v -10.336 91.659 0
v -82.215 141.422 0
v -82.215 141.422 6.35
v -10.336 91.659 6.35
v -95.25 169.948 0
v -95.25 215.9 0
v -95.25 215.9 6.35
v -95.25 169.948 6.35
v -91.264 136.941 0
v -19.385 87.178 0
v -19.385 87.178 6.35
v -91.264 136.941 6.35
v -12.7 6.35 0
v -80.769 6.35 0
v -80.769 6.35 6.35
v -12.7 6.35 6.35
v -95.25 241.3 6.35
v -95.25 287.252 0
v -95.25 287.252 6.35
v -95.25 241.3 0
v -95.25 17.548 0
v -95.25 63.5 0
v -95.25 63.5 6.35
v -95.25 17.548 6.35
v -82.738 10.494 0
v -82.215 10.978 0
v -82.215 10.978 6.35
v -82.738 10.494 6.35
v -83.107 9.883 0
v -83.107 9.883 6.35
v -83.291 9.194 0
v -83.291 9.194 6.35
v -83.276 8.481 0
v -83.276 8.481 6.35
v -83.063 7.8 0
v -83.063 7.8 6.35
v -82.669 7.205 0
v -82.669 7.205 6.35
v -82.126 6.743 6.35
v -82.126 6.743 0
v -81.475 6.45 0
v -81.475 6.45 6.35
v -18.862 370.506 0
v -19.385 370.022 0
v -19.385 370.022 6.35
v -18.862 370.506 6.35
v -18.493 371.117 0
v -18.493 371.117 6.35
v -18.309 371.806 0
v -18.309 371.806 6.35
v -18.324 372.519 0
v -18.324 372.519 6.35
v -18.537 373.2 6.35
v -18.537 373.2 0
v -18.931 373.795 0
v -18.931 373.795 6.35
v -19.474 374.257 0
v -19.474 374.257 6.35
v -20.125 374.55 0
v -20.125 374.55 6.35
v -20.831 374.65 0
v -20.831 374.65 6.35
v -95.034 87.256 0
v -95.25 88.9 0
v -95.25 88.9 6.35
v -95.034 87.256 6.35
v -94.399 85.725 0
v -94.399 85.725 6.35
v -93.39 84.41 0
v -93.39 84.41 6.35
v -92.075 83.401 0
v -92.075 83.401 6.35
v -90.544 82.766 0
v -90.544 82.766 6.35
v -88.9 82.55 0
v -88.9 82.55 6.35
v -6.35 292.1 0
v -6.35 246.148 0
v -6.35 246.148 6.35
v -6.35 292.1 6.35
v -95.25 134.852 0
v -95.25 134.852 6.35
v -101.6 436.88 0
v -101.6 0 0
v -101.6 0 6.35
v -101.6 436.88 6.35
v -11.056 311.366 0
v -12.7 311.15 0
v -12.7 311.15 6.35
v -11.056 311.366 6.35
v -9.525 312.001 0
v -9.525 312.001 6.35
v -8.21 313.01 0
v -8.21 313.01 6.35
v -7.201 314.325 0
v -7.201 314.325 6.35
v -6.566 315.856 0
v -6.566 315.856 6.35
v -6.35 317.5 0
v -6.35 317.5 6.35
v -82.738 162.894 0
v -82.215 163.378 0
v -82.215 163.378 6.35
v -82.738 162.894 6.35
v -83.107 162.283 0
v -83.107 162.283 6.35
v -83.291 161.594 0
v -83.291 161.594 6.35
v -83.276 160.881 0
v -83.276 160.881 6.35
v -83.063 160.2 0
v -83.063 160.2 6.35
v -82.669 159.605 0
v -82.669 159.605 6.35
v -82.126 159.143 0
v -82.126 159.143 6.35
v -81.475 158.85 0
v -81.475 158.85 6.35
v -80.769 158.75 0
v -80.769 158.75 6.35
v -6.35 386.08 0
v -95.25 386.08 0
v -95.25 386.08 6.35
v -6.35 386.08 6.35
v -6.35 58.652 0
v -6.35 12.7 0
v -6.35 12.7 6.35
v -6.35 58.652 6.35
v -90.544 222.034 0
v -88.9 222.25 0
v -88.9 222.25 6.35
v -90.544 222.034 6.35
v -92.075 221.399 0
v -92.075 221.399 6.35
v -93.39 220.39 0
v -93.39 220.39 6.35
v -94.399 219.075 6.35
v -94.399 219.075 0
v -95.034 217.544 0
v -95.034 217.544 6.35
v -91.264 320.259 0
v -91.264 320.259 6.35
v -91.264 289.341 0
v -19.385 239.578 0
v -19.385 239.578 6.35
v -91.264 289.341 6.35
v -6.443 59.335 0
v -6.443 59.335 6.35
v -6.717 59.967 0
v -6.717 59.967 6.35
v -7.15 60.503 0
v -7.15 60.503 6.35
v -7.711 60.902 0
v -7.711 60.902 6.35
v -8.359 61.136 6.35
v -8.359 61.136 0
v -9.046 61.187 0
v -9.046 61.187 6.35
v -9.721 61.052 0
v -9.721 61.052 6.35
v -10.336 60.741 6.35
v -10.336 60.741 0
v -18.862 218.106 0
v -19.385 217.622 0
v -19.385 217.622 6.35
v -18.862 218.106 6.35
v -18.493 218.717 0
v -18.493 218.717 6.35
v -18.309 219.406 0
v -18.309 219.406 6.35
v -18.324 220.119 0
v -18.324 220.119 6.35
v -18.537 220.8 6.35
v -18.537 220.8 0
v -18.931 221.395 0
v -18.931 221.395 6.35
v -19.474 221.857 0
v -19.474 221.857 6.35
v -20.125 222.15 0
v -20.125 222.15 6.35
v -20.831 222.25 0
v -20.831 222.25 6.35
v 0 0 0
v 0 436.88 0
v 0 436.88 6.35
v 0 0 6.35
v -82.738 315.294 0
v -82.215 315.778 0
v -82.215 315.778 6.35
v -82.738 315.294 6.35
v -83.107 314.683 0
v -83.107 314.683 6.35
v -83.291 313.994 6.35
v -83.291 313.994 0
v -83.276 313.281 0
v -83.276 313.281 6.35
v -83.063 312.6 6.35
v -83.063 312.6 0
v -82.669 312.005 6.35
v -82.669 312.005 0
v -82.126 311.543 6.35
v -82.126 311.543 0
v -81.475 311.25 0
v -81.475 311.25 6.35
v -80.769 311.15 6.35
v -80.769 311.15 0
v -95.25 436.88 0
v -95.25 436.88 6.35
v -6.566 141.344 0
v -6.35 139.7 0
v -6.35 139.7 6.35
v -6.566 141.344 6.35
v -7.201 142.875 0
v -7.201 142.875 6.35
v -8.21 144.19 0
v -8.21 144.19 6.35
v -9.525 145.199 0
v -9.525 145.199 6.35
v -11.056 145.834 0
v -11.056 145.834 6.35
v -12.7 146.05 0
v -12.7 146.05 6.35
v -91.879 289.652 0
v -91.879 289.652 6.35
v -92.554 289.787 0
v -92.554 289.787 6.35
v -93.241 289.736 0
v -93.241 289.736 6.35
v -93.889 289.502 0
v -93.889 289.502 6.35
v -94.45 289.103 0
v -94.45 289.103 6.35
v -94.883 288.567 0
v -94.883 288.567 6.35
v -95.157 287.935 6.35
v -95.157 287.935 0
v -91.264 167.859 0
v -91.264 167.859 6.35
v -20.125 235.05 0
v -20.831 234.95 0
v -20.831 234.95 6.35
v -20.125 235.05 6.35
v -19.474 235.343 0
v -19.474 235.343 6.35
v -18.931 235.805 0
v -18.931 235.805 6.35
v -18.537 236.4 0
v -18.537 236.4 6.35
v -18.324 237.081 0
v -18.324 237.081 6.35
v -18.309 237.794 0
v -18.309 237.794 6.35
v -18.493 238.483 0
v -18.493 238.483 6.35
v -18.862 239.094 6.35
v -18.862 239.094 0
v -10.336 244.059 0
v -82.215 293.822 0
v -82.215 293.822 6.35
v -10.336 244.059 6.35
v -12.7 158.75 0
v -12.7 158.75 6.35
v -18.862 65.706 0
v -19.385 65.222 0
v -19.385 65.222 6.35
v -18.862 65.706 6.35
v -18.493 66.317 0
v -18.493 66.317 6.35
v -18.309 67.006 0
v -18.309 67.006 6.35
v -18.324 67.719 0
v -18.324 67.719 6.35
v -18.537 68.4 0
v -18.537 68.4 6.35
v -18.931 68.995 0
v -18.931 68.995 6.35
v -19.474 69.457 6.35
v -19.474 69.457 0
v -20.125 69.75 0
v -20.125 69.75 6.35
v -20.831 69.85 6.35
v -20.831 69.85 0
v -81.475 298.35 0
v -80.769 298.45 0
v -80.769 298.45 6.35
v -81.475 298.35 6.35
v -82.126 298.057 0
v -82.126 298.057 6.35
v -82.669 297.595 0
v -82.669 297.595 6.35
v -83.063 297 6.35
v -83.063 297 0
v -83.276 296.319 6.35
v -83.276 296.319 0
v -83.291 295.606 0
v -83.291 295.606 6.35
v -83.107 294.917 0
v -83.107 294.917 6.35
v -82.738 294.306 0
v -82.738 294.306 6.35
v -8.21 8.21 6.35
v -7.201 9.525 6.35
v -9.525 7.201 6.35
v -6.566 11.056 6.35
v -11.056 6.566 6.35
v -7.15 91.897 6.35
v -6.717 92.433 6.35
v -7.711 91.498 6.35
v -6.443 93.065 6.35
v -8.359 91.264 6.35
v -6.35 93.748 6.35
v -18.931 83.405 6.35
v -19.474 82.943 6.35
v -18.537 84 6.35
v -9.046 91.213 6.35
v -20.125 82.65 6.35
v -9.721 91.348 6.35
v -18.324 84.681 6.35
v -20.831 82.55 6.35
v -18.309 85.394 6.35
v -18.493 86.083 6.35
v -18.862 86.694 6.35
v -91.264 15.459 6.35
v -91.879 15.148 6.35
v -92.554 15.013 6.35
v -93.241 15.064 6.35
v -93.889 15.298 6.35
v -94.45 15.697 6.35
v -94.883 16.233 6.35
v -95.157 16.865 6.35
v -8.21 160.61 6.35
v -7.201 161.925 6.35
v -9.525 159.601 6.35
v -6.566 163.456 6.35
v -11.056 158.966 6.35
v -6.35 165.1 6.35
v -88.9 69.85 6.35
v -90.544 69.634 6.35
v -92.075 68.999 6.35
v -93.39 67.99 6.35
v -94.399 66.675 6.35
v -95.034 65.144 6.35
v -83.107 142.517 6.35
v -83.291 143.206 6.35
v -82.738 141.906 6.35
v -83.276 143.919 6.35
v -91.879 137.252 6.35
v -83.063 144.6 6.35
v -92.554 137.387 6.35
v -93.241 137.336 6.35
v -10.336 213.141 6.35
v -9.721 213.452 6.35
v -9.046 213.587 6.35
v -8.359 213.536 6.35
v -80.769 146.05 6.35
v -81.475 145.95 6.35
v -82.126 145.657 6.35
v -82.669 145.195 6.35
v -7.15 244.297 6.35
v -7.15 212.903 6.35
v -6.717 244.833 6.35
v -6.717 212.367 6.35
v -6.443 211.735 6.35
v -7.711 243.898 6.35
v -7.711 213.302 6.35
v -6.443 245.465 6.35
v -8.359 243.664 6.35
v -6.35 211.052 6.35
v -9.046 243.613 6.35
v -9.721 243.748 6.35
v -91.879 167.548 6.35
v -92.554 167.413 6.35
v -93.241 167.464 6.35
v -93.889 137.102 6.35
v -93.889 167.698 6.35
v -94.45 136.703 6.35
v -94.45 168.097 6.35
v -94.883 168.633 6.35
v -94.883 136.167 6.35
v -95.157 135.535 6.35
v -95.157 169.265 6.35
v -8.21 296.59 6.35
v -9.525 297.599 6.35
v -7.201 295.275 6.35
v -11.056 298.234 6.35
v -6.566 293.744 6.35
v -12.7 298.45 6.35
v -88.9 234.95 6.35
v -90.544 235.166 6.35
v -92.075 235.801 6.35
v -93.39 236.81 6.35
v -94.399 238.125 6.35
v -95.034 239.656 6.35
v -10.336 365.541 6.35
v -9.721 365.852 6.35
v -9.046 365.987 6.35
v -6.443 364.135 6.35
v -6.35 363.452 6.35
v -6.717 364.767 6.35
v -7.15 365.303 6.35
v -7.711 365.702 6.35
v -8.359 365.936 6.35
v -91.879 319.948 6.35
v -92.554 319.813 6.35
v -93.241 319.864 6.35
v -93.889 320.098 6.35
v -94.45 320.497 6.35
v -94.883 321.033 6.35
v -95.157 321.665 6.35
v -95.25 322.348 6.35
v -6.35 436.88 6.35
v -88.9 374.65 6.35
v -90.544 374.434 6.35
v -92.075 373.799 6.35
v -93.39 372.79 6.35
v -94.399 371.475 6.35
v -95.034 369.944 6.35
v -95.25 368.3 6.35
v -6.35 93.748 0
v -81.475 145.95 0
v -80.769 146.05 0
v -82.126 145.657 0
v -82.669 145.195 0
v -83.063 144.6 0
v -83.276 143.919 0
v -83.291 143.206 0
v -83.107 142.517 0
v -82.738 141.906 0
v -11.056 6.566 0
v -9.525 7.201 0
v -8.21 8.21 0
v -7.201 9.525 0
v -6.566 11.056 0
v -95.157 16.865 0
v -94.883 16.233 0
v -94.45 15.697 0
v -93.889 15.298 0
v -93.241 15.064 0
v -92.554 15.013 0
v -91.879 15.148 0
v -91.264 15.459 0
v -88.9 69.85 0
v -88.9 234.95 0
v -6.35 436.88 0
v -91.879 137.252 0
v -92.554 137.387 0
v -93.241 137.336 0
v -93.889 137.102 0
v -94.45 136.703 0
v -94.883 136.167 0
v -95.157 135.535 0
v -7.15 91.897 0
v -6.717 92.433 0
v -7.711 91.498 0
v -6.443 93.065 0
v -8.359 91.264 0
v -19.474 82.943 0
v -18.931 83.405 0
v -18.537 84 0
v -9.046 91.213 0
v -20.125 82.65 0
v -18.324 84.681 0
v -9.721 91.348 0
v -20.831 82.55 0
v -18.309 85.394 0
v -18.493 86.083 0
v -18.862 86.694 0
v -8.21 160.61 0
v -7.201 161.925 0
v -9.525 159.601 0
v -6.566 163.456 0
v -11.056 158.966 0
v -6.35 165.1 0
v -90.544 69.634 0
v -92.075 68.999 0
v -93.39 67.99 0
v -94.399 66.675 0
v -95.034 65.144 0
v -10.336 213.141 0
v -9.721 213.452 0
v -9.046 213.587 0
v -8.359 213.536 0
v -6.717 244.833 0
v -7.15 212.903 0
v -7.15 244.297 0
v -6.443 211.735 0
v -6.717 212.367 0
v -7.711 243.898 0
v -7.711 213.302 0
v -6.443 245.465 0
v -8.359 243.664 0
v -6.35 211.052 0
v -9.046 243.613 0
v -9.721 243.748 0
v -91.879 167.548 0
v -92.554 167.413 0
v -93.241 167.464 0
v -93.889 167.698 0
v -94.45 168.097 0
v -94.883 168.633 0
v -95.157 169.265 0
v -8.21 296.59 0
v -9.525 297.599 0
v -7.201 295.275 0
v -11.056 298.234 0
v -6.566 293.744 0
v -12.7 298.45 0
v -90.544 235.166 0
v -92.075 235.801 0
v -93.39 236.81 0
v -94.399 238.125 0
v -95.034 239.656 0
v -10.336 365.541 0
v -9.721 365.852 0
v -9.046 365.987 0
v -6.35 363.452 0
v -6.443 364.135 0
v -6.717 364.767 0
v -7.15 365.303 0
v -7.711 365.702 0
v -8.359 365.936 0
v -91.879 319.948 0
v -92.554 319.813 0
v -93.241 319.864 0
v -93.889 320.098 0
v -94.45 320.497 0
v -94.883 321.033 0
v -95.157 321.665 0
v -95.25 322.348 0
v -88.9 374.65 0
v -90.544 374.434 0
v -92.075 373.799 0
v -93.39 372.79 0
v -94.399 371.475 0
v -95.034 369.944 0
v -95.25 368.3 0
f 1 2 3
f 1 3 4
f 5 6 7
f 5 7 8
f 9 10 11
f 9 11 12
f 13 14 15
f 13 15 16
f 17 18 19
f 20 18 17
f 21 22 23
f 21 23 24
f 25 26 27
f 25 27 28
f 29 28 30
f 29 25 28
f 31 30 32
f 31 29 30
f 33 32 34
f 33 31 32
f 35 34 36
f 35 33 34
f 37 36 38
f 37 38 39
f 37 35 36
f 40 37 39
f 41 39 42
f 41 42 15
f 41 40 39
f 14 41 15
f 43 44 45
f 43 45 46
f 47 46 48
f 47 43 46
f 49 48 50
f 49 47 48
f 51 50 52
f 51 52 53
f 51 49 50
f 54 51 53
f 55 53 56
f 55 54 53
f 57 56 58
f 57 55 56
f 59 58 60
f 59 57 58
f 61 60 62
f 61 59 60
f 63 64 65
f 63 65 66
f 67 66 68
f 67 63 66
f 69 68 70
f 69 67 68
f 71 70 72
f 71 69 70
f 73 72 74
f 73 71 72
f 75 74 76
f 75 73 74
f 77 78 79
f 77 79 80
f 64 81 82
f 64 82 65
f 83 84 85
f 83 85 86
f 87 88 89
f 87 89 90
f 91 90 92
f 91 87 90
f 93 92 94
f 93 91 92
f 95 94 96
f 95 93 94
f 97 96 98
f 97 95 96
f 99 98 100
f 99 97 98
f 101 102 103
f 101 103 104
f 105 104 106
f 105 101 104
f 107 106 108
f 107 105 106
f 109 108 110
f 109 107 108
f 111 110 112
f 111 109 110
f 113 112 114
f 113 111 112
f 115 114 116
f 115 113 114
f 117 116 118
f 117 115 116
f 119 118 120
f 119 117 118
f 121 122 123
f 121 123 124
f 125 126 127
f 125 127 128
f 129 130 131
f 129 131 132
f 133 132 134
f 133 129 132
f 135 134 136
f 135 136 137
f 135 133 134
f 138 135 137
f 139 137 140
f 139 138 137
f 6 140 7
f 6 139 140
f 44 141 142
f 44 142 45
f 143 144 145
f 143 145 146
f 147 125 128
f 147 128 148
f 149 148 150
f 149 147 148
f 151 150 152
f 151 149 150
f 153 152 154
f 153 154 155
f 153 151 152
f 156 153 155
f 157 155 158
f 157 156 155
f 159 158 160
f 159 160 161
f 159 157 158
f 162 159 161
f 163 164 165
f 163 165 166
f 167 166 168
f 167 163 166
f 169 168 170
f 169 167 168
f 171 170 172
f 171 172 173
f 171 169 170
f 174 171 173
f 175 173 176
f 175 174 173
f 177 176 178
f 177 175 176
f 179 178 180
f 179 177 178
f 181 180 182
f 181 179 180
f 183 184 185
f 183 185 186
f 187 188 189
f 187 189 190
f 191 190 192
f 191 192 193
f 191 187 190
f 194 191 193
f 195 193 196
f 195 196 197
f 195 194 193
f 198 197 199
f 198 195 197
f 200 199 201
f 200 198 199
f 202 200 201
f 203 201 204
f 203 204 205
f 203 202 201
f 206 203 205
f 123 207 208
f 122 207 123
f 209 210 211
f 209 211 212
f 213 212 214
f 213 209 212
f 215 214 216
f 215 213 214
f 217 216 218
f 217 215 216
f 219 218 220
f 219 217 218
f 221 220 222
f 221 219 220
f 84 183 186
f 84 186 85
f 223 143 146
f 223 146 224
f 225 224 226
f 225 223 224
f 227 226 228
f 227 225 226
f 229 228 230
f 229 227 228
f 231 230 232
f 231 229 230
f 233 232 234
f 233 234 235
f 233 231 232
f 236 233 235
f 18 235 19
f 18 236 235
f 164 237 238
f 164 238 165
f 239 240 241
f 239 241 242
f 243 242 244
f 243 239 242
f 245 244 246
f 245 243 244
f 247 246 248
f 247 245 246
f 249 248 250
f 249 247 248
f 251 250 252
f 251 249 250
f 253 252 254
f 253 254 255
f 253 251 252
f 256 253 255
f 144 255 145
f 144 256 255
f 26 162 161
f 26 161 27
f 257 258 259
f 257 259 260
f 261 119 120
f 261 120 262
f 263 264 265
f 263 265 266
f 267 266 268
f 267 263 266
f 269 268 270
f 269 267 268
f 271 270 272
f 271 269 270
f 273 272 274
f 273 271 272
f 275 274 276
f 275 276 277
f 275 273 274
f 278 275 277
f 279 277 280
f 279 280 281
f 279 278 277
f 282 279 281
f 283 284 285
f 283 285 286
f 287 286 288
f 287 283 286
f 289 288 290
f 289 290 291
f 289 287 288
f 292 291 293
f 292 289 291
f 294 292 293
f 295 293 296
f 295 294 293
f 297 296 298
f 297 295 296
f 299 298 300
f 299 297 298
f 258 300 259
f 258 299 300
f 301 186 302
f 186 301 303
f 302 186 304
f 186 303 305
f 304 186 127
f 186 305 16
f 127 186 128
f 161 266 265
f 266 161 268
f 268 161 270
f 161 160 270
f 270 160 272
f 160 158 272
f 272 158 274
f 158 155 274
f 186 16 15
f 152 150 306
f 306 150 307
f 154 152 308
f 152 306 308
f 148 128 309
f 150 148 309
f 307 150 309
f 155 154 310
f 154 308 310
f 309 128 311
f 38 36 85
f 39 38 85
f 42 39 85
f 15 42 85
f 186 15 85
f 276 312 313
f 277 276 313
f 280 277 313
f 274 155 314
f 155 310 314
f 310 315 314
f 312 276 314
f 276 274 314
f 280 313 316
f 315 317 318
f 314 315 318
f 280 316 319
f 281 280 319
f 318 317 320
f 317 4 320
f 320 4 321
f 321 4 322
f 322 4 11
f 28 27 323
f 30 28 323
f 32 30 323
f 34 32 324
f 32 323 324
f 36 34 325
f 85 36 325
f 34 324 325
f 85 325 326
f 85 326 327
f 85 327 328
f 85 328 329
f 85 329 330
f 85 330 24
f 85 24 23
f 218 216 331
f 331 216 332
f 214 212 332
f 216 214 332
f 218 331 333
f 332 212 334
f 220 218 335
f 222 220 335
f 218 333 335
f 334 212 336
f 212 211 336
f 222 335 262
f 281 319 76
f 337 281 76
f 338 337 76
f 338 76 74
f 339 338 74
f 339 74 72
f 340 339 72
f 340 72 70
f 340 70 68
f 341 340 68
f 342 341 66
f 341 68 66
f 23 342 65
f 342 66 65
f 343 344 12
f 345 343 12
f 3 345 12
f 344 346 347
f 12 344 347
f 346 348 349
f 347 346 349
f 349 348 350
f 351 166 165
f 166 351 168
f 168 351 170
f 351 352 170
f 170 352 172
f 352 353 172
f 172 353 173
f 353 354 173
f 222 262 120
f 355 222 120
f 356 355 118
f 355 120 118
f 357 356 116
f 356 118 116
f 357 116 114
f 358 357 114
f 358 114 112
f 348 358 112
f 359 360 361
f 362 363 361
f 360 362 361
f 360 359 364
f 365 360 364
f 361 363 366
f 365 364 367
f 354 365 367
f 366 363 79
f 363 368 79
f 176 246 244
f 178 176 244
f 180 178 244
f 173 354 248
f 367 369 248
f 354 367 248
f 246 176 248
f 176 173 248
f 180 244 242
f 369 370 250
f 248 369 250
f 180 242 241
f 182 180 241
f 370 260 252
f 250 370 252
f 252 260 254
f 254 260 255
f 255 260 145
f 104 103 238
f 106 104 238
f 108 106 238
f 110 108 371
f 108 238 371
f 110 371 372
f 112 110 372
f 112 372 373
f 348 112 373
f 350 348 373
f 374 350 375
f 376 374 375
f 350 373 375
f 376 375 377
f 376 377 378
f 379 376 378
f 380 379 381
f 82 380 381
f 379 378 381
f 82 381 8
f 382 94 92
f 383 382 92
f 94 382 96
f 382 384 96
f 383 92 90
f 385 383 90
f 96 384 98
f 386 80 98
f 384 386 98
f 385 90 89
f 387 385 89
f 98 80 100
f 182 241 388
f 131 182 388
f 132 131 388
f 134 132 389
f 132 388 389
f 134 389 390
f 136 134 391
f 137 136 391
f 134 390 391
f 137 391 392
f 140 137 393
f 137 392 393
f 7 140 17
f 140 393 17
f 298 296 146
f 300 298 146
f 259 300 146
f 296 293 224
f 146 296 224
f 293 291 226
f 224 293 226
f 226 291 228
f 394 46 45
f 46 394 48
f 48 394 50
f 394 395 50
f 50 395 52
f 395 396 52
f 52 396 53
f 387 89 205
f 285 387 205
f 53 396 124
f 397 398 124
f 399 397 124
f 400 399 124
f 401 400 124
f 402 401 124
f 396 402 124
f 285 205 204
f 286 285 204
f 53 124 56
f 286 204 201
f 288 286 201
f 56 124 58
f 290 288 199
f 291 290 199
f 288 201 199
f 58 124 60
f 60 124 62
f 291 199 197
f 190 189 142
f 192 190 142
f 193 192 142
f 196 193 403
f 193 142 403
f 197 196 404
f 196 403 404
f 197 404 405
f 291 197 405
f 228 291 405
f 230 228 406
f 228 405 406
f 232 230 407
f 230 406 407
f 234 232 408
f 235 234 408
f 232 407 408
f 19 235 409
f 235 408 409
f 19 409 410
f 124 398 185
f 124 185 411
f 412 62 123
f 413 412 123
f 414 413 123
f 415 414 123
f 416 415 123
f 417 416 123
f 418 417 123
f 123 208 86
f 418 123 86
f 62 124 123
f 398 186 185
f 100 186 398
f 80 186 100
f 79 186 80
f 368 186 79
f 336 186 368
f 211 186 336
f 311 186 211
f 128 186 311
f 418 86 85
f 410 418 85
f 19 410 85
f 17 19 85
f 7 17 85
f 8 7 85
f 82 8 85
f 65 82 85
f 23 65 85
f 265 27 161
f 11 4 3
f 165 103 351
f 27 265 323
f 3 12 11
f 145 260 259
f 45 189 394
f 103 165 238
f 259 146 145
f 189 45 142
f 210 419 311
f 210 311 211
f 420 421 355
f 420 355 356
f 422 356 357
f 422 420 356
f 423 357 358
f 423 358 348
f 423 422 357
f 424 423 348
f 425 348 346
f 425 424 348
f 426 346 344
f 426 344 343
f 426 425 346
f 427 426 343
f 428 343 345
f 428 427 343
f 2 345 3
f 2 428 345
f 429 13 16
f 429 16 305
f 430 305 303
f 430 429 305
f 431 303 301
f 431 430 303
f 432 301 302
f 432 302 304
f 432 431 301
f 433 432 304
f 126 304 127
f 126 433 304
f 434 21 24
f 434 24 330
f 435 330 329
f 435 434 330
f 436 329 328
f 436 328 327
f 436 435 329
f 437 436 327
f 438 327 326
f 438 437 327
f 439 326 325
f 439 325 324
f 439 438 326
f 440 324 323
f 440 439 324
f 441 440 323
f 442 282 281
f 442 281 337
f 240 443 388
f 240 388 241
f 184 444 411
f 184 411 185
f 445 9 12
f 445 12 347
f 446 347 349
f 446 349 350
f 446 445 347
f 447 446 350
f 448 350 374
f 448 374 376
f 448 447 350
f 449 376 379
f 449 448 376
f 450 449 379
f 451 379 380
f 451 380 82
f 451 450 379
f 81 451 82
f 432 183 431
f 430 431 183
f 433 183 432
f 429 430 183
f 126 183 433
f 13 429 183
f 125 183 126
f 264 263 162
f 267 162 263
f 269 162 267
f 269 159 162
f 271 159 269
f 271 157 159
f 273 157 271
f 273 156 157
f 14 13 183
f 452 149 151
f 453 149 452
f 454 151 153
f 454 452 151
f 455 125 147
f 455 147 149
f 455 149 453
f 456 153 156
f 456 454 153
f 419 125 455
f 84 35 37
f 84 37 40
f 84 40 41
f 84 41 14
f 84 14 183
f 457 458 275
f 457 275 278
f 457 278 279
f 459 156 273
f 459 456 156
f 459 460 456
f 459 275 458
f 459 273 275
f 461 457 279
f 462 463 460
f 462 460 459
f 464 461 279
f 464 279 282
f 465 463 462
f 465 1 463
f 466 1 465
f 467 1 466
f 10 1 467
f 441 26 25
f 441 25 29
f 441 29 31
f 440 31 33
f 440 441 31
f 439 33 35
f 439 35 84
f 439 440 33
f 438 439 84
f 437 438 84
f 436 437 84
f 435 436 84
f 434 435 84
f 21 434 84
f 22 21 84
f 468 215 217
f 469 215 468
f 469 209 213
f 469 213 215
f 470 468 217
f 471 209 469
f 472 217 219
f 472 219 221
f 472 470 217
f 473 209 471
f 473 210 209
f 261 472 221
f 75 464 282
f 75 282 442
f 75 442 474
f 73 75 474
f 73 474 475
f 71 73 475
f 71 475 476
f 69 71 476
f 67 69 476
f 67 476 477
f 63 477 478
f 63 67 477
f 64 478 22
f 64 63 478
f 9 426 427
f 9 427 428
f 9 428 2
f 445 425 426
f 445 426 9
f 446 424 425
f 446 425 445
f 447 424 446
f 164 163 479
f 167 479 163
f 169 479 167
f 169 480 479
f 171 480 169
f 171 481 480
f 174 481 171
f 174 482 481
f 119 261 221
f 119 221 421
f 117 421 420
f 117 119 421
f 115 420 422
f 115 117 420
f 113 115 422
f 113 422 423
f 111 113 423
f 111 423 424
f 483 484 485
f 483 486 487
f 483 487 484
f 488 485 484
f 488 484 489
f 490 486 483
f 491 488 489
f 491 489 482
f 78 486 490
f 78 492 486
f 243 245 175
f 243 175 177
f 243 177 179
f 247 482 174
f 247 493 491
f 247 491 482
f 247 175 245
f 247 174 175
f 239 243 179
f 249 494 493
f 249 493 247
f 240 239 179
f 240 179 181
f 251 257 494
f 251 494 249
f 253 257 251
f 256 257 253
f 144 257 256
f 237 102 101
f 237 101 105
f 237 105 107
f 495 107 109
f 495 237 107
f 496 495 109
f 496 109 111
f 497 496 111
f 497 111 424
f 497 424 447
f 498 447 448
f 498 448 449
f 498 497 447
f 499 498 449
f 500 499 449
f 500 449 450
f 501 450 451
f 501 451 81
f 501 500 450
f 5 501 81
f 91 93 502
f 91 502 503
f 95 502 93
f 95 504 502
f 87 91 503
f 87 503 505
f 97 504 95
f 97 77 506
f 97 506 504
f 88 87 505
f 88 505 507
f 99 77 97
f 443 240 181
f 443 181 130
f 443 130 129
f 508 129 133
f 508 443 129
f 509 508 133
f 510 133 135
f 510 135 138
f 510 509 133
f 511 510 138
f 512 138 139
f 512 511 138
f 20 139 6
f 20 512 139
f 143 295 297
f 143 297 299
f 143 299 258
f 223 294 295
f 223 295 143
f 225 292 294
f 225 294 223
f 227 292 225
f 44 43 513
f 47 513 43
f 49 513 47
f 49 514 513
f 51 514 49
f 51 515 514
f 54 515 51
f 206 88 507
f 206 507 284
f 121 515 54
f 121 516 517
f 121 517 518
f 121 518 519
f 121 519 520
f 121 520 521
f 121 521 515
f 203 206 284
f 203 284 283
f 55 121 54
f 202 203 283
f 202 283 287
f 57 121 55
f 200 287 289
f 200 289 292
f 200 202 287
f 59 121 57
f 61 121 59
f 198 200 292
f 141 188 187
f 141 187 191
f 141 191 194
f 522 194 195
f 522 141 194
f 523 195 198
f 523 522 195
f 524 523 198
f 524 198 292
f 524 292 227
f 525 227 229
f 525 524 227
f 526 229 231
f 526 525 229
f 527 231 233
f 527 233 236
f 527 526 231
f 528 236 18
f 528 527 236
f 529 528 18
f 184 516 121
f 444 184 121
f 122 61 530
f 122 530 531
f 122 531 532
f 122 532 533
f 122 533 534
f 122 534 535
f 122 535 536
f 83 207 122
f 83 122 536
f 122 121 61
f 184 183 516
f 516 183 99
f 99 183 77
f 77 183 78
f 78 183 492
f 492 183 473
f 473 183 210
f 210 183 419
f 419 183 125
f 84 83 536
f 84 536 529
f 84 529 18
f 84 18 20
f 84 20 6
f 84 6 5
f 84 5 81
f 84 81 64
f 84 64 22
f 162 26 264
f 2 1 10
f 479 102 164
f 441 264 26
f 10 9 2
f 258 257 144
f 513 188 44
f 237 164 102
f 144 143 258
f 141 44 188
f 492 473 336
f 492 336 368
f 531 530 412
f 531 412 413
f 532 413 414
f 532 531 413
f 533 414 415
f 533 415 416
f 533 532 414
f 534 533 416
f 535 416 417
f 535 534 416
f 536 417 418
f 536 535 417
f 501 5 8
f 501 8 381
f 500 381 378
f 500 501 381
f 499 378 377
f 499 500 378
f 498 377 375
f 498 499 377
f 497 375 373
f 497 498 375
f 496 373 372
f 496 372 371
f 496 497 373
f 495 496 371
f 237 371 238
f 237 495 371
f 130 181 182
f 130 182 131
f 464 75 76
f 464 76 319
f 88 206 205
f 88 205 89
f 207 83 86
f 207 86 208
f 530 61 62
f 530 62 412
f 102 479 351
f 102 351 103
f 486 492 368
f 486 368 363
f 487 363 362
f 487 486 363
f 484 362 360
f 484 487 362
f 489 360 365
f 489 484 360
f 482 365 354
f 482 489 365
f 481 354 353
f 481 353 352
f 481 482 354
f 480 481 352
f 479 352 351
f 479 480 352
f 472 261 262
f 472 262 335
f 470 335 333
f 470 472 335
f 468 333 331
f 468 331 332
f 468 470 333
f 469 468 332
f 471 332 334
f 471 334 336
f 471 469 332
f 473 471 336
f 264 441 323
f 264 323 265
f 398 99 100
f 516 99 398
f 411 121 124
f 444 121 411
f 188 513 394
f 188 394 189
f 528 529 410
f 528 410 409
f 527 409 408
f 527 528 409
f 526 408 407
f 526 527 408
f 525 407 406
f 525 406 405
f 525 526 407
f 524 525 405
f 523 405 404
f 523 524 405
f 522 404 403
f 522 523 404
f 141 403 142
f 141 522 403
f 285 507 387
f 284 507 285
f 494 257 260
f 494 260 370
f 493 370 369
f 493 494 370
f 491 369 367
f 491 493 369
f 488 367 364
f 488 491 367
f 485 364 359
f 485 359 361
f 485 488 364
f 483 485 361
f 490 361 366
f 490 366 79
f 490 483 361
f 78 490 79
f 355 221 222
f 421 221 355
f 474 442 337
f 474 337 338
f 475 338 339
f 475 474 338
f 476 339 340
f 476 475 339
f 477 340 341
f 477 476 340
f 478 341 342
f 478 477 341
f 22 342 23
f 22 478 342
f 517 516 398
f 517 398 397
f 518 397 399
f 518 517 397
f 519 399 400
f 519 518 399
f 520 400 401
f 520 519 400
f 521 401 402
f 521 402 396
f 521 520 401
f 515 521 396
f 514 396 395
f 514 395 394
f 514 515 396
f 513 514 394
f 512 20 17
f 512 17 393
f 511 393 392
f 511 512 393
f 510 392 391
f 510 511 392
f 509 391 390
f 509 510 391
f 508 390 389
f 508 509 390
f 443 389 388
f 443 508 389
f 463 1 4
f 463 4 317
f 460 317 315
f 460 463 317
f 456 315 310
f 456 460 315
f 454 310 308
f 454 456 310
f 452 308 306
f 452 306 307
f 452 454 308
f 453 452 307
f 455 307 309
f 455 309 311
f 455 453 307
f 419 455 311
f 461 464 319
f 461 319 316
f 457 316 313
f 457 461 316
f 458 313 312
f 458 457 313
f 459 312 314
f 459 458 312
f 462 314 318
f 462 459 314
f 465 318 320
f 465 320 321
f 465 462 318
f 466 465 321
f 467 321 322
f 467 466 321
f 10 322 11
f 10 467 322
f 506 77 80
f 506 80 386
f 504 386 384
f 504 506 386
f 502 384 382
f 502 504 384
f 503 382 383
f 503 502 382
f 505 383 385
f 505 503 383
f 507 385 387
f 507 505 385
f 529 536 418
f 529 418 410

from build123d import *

# Parameters (mm, degrees)
BOSS_EXTRUDE1_DEPTH = 6.35


with BuildPart() as part:
    # Model → Boss-Extrude1 (new body)
    with BuildSketch(Plane.XY):
        Polygon((-95.25, 386.08), (-6.35, 386.08), (-6.35, 436.88), (0, 436.88), (0, 0), (-101.6, 0), (-101.6, 436.88), (-95.25, 436.88), align=None)
        with BuildLine():
            Line((-80.76878597, 311.15), (-12.7, 311.15))
            ThreePointArc((-12.7, 311.15), (-8.209871939, 313.009871939), (-6.35, 317.5))
            Line((-6.35, 317.5), (-6.35, 363.45223644))
            ThreePointArc((-6.35, 363.45223644), (-7.711169032, 365.702115893), (-10.335793346, 365.540604607))
            Line((-10.335793346, 365.540604607), (-82.214579316, 315.778368167))
            ThreePointArc((-82.214579316, 315.778368167), (-83.193250358, 312.932654354), (-80.76878597, 311.15))
        make_face(mode=Mode.SUBTRACT)
        with BuildLine():
            Line((-95.25, 287.25223644), (-95.25, 241.3))
            ThreePointArc((-95.25, 241.3), (-93.390128061, 236.809871939), (-88.9, 234.95))
            Line((-88.9, 234.95), (-20.83121403, 234.95))
            ThreePointArc((-20.83121403, 234.95), (-18.406749642, 236.732654354), (-19.385420684, 239.578368167))
            Line((-19.385420684, 239.578368167), (-91.264206654, 289.340604607))
            ThreePointArc((-91.264206654, 289.340604607), (-93.888830968, 289.502115893), (-95.25, 287.25223644))
        make_face(mode=Mode.SUBTRACT)
        with BuildLine():
            Line((-80.76878597, 158.75), (-12.7, 158.75))
            ThreePointArc((-12.7, 158.75), (-8.209871939, 160.609871939), (-6.35, 165.1))
            Line((-6.35, 165.1), (-6.35, 211.05223644))
            ThreePointArc((-6.35, 211.05223644), (-7.711169032, 213.302115893), (-10.335793346, 213.140604607))
            Line((-10.335793346, 213.140604607), (-82.214579316, 163.378368167))
            ThreePointArc((-82.214579316, 163.378368167), (-83.193250358, 160.532654354), (-80.76878597, 158.75))
        make_face(mode=Mode.SUBTRACT)
        with BuildLine():
            Line((-20.83121403, 222.25), (-88.9, 222.25))
            ThreePointArc((-88.9, 222.25), (-93.390128061, 220.390128061), (-95.25, 215.9))
            Line((-95.25, 215.9), (-95.25, 169.94776356))
            ThreePointArc((-95.25, 169.94776356), (-93.888830968, 167.697884107), (-91.264206654, 167.859395393))
            Line((-91.264206654, 167.859395393), (-19.385420684, 217.621631833))
            ThreePointArc((-19.385420684, 217.621631833), (-18.406749642, 220.467345646), (-20.83121403, 222.25))
        make_face(mode=Mode.SUBTRACT)
        with BuildLine():
            Line((-82.214579316, 293.821631833), (-10.335793346, 244.059395393))
            ThreePointArc((-10.335793346, 244.059395393), (-7.711169032, 243.897884107), (-6.35, 246.14776356))
            Line((-6.35, 246.14776356), (-6.35, 292.1))
            ThreePointArc((-6.35, 292.1), (-8.209871939, 296.590128061), (-12.7, 298.45))
            Line((-12.7, 298.45), (-80.76878597, 298.45))
            ThreePointArc((-80.76878597, 298.45), (-83.193250358, 296.667345646), (-82.214579316, 293.821631833))
        make_face(mode=Mode.SUBTRACT)
        with BuildLine():
            Line((-95.25, 134.85223644), (-95.25, 88.9))
            ThreePointArc((-95.25, 88.9), (-93.390128061, 84.409871939), (-88.9, 82.55))
            Line((-88.9, 82.55), (-20.83121403, 82.55))
            ThreePointArc((-20.83121403, 82.55), (-18.406749642, 84.332654354), (-19.385420684, 87.178368167))
            Line((-19.385420684, 87.178368167), (-91.264206654, 136.940604607))
            ThreePointArc((-91.264206654, 136.940604607), (-93.888830968, 137.102115893), (-95.25, 134.85223644))
        make_face(mode=Mode.SUBTRACT)
        with BuildLine():
            Line((-80.76878597, 6.35), (-12.7, 6.35))
            ThreePointArc((-12.7, 6.35), (-8.209871939, 8.209871939), (-6.35, 12.7))
            Line((-6.35, 12.7), (-6.35, 58.65223644))
            ThreePointArc((-6.35, 58.65223644), (-7.711169032, 60.902115893), (-10.335793346, 60.740604607))
            Line((-10.335793346, 60.740604607), (-82.214579316, 10.978368167))
            ThreePointArc((-82.214579316, 10.978368167), (-83.193250358, 8.132654354), (-80.76878597, 6.35))
        make_face(mode=Mode.SUBTRACT)
        with BuildLine():
            Line((-20.83121403, 69.85), (-88.9, 69.85))
            ThreePointArc((-88.9, 69.85), (-93.390128061, 67.990128061), (-95.25, 63.5))
            Line((-95.25, 63.5), (-95.25, 17.54776356))
            ThreePointArc((-95.25, 17.54776356), (-93.888830968, 15.297884107), (-91.264206654, 15.459395393))
            Line((-91.264206654, 15.459395393), (-19.385420684, 65.221631833))
            ThreePointArc((-19.385420684, 65.221631833), (-18.406749642, 68.067345646), (-20.83121403, 69.85))
        make_face(mode=Mode.SUBTRACT)
        with BuildLine():
            Line((-20.83121403, 374.65), (-88.9, 374.65))
            ThreePointArc((-88.9, 374.65), (-93.390128061, 372.790128061), (-95.25, 368.3))
            Line((-95.25, 368.3), (-95.25, 322.34776356))
            ThreePointArc((-95.25, 322.34776356), (-93.888830968, 320.097884107), (-91.264206654, 320.259395393))
            Line((-91.264206654, 320.259395393), (-19.385420684, 370.021631833))
            ThreePointArc((-19.385420684, 370.021631833), (-18.406749642, 372.867345646), (-20.83121403, 374.65))
        make_face(mode=Mode.SUBTRACT)
        with BuildLine():
            Line((-82.214579316, 141.421631833), (-10.335793346, 91.659395393))
            ThreePointArc((-10.335793346, 91.659395393), (-7.711169032, 91.497884107), (-6.35, 93.74776356))
            Line((-6.35, 93.74776356), (-6.35, 139.7))
            ThreePointArc((-6.35, 139.7), (-8.209871939, 144.190128061), (-12.7, 146.05))
            Line((-12.7, 146.05), (-80.76878597, 146.05))
            ThreePointArc((-80.76878597, 146.05), (-83.193250358, 144.267345646), (-82.214579316, 141.421631833))
        make_face(mode=Mode.SUBTRACT)
    extrude(amount=BOSS_EXTRUDE1_DEPTH)


solid = part.part
